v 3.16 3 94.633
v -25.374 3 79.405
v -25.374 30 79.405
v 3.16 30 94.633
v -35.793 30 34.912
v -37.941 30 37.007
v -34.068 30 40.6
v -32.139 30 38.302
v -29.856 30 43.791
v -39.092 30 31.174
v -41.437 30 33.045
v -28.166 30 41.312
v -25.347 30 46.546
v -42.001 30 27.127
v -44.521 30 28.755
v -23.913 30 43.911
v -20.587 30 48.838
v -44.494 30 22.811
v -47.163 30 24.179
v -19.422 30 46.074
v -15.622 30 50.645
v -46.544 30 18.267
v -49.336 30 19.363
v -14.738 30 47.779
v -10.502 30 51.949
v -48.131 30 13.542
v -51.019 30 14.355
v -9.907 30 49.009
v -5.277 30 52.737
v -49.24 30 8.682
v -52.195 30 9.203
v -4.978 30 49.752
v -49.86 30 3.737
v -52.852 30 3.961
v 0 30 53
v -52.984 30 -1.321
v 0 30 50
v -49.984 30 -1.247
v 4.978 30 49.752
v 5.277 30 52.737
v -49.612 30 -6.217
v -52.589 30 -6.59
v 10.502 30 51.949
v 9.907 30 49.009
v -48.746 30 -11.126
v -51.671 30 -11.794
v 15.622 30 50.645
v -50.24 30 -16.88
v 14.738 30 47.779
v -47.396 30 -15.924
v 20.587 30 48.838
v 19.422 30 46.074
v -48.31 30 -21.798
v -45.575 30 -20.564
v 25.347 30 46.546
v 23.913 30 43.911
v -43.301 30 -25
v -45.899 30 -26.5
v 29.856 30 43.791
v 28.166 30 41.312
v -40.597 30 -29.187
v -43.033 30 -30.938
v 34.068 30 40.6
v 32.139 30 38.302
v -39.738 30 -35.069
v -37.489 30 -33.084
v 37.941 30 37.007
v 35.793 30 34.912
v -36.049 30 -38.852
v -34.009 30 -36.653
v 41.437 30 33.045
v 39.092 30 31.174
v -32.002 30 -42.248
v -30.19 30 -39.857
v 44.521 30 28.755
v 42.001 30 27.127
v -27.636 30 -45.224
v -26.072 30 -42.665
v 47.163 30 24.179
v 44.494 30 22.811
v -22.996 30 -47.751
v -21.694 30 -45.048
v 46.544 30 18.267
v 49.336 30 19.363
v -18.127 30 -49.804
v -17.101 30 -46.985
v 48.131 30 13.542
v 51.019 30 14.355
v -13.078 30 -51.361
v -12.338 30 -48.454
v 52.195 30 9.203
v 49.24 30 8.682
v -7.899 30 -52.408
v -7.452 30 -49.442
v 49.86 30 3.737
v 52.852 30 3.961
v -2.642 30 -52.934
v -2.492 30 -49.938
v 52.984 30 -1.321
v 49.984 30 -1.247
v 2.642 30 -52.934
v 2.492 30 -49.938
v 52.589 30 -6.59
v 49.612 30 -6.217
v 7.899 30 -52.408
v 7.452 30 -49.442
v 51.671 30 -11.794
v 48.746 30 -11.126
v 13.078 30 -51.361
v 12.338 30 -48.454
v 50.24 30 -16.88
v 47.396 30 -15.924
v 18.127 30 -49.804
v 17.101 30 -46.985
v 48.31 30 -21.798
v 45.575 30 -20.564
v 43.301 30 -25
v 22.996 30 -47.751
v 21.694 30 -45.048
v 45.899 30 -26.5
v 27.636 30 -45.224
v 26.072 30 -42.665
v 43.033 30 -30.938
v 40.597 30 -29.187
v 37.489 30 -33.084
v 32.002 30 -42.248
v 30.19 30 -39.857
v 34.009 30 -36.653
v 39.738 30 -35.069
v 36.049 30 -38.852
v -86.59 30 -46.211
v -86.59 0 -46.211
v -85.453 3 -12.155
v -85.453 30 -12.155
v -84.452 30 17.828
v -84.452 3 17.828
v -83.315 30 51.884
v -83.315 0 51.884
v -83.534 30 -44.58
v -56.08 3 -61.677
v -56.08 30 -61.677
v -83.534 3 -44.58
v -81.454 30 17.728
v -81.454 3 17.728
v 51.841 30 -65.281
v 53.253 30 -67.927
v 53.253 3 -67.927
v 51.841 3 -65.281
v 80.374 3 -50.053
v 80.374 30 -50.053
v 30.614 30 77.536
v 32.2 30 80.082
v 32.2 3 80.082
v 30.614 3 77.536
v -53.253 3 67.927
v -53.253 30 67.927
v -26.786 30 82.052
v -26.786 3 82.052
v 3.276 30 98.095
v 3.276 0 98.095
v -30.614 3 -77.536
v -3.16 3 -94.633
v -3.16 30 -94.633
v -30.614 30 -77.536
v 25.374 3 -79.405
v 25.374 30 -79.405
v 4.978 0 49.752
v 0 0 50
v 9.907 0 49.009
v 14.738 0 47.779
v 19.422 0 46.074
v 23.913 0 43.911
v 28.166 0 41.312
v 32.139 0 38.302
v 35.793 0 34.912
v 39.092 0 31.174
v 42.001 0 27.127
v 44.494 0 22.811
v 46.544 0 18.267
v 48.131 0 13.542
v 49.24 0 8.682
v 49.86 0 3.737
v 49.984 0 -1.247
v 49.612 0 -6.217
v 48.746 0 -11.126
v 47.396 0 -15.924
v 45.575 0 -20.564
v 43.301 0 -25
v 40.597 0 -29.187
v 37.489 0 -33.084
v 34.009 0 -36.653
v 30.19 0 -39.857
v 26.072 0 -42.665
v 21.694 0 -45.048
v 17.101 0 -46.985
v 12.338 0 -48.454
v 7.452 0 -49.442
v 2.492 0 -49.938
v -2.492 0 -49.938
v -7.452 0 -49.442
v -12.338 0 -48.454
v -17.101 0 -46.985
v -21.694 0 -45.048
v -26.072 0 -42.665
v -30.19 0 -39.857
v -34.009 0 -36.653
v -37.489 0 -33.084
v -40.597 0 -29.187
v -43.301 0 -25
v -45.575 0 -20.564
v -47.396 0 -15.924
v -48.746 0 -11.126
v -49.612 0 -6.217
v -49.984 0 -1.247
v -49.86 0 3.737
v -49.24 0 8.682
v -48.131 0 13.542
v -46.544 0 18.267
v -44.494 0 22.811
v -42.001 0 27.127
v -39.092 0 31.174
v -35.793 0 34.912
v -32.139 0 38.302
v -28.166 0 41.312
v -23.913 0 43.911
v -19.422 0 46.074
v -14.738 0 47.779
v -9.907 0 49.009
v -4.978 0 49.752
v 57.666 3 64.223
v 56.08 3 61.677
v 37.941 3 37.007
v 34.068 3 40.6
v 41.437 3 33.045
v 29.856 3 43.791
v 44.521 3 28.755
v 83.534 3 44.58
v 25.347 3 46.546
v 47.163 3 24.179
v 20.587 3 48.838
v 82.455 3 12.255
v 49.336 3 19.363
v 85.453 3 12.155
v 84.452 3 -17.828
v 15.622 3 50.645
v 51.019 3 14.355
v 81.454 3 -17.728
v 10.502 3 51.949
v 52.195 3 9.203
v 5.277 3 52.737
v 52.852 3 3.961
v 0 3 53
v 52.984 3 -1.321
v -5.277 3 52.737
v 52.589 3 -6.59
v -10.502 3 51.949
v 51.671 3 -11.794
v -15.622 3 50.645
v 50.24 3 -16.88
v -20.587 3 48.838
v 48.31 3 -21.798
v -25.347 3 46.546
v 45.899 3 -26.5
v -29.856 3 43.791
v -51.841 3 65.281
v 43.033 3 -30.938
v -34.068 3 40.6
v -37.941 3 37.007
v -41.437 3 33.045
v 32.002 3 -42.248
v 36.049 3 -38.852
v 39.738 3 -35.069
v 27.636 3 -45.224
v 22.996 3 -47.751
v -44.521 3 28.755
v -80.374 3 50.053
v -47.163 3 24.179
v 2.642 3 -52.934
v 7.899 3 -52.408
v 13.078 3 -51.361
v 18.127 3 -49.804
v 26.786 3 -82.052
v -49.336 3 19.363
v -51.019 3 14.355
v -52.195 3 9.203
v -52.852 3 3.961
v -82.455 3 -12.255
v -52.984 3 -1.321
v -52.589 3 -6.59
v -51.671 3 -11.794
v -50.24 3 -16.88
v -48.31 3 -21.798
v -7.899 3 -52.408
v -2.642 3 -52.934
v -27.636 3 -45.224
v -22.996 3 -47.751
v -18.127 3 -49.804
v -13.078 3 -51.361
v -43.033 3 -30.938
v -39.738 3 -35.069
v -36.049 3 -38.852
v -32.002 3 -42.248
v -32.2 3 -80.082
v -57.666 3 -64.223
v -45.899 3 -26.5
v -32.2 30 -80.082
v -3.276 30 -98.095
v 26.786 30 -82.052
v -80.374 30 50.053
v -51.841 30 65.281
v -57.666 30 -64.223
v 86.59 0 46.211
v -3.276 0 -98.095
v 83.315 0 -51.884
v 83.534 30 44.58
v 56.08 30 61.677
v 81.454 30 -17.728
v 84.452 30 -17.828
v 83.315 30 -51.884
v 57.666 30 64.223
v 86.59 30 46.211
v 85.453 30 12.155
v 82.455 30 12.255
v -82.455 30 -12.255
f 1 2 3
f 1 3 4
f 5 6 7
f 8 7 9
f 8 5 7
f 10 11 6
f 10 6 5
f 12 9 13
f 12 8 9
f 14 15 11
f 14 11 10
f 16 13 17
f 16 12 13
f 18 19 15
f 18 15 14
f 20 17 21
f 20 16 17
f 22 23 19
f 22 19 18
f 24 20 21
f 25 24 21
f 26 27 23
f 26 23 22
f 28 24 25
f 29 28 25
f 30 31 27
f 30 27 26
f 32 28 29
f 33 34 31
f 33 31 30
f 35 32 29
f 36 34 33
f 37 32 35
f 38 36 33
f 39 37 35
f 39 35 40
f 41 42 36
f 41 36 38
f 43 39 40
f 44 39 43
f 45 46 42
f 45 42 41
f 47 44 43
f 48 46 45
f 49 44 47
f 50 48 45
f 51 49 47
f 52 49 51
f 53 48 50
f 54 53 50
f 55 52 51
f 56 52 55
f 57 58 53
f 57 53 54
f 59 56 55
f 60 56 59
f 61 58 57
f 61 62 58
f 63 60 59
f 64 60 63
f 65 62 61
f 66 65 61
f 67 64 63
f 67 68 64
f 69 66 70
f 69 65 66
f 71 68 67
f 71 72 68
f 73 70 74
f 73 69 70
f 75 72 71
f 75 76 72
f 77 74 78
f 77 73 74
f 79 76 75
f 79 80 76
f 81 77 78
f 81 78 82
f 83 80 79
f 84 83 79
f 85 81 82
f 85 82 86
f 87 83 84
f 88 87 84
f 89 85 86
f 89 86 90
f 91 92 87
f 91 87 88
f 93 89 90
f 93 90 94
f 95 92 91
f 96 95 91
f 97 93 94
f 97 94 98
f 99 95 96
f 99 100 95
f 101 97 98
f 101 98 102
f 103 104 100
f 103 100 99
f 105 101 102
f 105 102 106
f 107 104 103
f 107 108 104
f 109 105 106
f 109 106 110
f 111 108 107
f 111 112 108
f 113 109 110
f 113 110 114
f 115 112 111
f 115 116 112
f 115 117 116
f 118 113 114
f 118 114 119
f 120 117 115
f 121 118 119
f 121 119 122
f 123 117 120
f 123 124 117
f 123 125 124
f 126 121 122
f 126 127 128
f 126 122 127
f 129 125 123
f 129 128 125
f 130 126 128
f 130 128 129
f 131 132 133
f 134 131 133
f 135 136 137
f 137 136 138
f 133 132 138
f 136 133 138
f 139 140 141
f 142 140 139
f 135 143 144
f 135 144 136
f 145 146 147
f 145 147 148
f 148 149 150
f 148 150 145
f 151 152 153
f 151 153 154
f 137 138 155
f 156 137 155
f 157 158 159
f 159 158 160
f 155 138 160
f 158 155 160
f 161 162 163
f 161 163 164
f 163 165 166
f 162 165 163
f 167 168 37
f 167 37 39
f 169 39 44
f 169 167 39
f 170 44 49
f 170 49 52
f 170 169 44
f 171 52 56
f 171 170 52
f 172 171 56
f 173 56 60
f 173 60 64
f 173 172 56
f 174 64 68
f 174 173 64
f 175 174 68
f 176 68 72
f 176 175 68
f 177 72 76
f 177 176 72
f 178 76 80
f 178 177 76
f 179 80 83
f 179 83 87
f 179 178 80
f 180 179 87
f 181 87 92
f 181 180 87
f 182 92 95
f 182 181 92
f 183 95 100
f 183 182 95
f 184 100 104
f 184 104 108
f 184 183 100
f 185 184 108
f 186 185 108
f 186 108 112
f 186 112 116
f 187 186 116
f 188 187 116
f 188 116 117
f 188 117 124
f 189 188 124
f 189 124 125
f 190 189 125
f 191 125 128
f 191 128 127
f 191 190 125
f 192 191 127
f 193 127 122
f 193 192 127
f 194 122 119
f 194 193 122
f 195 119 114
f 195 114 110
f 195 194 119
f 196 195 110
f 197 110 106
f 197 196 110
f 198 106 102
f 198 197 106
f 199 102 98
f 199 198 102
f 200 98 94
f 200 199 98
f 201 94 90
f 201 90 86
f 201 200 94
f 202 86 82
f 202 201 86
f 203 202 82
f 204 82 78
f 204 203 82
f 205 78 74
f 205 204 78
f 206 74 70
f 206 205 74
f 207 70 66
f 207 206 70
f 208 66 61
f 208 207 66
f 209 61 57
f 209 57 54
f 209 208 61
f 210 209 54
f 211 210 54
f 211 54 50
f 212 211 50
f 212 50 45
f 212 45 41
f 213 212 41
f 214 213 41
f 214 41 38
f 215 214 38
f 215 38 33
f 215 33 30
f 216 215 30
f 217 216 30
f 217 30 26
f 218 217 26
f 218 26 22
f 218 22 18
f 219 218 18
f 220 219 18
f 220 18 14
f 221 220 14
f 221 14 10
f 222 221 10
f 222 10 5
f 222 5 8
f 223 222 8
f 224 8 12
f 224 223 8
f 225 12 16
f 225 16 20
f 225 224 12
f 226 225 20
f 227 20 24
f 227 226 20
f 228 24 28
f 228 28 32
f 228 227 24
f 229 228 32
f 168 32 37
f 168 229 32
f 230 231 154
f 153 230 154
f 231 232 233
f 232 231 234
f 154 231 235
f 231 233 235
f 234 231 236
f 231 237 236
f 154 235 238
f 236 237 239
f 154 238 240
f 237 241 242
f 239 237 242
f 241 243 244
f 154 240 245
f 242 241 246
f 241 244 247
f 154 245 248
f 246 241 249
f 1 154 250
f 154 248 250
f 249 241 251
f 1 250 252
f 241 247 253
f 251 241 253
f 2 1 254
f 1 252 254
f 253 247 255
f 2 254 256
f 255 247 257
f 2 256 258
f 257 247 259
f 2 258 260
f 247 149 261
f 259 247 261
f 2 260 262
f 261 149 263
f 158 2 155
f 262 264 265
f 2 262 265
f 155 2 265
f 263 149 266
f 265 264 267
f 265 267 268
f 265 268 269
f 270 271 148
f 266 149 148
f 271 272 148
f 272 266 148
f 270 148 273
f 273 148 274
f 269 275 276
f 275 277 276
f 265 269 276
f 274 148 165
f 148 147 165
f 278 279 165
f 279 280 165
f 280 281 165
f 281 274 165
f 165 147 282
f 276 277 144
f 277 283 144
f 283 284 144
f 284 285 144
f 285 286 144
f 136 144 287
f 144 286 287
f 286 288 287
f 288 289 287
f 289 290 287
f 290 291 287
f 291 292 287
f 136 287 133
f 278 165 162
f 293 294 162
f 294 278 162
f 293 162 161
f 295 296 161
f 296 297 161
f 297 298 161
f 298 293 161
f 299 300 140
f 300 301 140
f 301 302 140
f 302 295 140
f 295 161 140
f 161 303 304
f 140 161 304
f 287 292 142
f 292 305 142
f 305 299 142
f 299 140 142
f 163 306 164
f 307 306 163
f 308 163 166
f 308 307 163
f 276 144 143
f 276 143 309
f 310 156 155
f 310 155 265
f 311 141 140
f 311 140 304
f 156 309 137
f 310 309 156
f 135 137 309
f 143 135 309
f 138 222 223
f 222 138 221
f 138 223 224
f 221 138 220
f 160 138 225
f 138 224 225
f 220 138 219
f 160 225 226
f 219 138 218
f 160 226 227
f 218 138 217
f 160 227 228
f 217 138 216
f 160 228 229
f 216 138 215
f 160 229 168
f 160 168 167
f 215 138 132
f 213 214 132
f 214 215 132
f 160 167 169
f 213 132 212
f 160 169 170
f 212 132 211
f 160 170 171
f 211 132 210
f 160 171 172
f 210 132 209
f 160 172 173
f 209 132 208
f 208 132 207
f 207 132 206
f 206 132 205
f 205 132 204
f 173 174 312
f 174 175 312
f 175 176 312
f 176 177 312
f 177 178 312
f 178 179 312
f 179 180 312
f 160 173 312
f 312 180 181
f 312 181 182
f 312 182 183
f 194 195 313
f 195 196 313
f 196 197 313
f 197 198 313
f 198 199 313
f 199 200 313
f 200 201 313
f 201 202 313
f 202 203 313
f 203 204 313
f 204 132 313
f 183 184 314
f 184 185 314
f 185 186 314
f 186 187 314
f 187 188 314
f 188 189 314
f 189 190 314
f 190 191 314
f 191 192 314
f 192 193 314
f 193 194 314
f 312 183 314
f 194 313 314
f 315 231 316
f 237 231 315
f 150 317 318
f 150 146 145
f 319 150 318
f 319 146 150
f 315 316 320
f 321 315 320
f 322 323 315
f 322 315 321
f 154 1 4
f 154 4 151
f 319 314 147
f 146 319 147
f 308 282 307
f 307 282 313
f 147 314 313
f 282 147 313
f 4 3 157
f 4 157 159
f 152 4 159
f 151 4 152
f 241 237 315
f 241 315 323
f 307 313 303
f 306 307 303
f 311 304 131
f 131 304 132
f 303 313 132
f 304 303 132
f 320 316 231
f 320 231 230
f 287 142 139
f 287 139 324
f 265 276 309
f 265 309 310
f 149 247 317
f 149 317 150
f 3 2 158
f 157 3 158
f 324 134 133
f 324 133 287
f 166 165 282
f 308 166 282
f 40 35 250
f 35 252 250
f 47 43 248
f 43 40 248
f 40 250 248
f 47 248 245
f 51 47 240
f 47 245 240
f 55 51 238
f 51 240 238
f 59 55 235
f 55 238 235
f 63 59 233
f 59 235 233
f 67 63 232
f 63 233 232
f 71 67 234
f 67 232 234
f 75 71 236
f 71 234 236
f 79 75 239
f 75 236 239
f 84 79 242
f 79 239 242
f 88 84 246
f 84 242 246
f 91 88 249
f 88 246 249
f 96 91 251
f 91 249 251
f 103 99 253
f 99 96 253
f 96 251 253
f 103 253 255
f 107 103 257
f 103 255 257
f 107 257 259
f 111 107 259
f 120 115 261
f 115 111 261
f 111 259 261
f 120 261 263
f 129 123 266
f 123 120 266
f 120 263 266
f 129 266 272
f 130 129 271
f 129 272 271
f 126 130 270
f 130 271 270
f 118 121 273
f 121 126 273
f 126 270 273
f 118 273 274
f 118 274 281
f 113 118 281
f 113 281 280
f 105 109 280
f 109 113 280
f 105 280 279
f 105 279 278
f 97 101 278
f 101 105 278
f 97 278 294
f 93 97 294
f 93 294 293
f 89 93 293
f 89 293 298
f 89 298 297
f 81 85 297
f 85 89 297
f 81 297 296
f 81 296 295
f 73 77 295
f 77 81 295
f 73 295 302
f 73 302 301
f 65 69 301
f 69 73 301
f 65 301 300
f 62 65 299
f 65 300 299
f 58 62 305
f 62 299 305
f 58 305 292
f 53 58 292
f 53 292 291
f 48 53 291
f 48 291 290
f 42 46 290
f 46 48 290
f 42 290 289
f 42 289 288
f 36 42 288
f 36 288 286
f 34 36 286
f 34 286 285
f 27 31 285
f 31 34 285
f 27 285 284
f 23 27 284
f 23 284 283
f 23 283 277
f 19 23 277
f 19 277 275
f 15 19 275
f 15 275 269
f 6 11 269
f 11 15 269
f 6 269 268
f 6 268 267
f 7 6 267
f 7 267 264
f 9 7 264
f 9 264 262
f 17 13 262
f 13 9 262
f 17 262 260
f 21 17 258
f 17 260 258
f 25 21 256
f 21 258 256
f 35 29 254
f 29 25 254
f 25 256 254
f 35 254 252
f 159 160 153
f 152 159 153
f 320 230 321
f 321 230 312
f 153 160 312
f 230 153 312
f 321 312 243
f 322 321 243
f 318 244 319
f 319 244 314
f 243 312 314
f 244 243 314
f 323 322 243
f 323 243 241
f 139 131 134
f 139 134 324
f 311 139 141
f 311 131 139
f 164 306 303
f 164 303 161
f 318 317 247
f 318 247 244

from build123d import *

# Parameters (mm, degrees)
SKETCH2_R           = 50
BOSS_EXTRUDE1_DEPTH = 30
SHELL1_T            = -3
CUT_EXTRUDE1_DEPTH  = 27


with BuildPart() as part:
    # Sketch2 → Boss-Extrude1 (new body)
    with BuildSketch(Plane(origin=(0, 0, 0), x_dir=(1, 0, 0), z_dir=(0, 1, 0))):
        Polygon((-83.314894361, -51.8841181), (3.275517147, -98.09487408), (86.590411508, -46.21075598), (83.314894361, 51.8841181), (-3.275517147, 98.09487408), (-86.590411508, 46.21075598), align=None)
        with Locations(Location((0, 0, 0), (0, 0, 270))):
            Circle(SKETCH2_R, mode=Mode.SUBTRACT)
    extrude(amount=BOSS_EXTRUDE1_DEPTH)

    # Shell1
    shell1_openings = [part.faces().sort_by_distance(p)[0] for p in [
        (-38.787596874, 30, 72.680784017),
    ]]
    offset(amount=SHELL1_T, openings=shell1_openings, kind=Kind.INTERSECTION)

    # Sketch8 → Cut-Extrude1 (cut)
    with BuildSketch(Plane(origin=(0, 30, 0), x_dir=(1, 0, 0), z_dir=(0, 1, 0))):
        Polygon((53.253129093, 67.9271981), (51.840669496, 65.280510003), (25.373788523, 79.405105982), (26.786248121, 82.051794079), align=None)
        Polygon((84.452062159, 17.828325695), (85.453243709, -12.154963576), (82.454914782, -12.255081731), (81.453733232, 17.72820754), align=None)
        Polygon((57.665814038, -64.223468384), (32.200114616, -80.082161676), (30.614245287, -77.535591734), (56.079944709, -61.676898442), align=None)
        Polygon((-26.786248121, -82.051794079), (-53.253129093, -67.9271981), (-51.840669496, -65.280510003), (-25.373788523, -79.405105982), align=None)
        Polygon((-84.452062159, -17.828325695), (-85.453243709, 12.154963576), (-82.454914782, 12.255081731), (-81.453733232, -17.72820754), align=None)
        Polygon((-57.665814038, 64.223468384), (-32.200114616, 80.082161676), (-30.614245287, 77.535591734), (-56.079944709, 61.676898442), align=None)
    extrude(amount=-CUT_EXTRUDE1_DEPTH, mode=Mode.SUBTRACT)


solid = part.part
